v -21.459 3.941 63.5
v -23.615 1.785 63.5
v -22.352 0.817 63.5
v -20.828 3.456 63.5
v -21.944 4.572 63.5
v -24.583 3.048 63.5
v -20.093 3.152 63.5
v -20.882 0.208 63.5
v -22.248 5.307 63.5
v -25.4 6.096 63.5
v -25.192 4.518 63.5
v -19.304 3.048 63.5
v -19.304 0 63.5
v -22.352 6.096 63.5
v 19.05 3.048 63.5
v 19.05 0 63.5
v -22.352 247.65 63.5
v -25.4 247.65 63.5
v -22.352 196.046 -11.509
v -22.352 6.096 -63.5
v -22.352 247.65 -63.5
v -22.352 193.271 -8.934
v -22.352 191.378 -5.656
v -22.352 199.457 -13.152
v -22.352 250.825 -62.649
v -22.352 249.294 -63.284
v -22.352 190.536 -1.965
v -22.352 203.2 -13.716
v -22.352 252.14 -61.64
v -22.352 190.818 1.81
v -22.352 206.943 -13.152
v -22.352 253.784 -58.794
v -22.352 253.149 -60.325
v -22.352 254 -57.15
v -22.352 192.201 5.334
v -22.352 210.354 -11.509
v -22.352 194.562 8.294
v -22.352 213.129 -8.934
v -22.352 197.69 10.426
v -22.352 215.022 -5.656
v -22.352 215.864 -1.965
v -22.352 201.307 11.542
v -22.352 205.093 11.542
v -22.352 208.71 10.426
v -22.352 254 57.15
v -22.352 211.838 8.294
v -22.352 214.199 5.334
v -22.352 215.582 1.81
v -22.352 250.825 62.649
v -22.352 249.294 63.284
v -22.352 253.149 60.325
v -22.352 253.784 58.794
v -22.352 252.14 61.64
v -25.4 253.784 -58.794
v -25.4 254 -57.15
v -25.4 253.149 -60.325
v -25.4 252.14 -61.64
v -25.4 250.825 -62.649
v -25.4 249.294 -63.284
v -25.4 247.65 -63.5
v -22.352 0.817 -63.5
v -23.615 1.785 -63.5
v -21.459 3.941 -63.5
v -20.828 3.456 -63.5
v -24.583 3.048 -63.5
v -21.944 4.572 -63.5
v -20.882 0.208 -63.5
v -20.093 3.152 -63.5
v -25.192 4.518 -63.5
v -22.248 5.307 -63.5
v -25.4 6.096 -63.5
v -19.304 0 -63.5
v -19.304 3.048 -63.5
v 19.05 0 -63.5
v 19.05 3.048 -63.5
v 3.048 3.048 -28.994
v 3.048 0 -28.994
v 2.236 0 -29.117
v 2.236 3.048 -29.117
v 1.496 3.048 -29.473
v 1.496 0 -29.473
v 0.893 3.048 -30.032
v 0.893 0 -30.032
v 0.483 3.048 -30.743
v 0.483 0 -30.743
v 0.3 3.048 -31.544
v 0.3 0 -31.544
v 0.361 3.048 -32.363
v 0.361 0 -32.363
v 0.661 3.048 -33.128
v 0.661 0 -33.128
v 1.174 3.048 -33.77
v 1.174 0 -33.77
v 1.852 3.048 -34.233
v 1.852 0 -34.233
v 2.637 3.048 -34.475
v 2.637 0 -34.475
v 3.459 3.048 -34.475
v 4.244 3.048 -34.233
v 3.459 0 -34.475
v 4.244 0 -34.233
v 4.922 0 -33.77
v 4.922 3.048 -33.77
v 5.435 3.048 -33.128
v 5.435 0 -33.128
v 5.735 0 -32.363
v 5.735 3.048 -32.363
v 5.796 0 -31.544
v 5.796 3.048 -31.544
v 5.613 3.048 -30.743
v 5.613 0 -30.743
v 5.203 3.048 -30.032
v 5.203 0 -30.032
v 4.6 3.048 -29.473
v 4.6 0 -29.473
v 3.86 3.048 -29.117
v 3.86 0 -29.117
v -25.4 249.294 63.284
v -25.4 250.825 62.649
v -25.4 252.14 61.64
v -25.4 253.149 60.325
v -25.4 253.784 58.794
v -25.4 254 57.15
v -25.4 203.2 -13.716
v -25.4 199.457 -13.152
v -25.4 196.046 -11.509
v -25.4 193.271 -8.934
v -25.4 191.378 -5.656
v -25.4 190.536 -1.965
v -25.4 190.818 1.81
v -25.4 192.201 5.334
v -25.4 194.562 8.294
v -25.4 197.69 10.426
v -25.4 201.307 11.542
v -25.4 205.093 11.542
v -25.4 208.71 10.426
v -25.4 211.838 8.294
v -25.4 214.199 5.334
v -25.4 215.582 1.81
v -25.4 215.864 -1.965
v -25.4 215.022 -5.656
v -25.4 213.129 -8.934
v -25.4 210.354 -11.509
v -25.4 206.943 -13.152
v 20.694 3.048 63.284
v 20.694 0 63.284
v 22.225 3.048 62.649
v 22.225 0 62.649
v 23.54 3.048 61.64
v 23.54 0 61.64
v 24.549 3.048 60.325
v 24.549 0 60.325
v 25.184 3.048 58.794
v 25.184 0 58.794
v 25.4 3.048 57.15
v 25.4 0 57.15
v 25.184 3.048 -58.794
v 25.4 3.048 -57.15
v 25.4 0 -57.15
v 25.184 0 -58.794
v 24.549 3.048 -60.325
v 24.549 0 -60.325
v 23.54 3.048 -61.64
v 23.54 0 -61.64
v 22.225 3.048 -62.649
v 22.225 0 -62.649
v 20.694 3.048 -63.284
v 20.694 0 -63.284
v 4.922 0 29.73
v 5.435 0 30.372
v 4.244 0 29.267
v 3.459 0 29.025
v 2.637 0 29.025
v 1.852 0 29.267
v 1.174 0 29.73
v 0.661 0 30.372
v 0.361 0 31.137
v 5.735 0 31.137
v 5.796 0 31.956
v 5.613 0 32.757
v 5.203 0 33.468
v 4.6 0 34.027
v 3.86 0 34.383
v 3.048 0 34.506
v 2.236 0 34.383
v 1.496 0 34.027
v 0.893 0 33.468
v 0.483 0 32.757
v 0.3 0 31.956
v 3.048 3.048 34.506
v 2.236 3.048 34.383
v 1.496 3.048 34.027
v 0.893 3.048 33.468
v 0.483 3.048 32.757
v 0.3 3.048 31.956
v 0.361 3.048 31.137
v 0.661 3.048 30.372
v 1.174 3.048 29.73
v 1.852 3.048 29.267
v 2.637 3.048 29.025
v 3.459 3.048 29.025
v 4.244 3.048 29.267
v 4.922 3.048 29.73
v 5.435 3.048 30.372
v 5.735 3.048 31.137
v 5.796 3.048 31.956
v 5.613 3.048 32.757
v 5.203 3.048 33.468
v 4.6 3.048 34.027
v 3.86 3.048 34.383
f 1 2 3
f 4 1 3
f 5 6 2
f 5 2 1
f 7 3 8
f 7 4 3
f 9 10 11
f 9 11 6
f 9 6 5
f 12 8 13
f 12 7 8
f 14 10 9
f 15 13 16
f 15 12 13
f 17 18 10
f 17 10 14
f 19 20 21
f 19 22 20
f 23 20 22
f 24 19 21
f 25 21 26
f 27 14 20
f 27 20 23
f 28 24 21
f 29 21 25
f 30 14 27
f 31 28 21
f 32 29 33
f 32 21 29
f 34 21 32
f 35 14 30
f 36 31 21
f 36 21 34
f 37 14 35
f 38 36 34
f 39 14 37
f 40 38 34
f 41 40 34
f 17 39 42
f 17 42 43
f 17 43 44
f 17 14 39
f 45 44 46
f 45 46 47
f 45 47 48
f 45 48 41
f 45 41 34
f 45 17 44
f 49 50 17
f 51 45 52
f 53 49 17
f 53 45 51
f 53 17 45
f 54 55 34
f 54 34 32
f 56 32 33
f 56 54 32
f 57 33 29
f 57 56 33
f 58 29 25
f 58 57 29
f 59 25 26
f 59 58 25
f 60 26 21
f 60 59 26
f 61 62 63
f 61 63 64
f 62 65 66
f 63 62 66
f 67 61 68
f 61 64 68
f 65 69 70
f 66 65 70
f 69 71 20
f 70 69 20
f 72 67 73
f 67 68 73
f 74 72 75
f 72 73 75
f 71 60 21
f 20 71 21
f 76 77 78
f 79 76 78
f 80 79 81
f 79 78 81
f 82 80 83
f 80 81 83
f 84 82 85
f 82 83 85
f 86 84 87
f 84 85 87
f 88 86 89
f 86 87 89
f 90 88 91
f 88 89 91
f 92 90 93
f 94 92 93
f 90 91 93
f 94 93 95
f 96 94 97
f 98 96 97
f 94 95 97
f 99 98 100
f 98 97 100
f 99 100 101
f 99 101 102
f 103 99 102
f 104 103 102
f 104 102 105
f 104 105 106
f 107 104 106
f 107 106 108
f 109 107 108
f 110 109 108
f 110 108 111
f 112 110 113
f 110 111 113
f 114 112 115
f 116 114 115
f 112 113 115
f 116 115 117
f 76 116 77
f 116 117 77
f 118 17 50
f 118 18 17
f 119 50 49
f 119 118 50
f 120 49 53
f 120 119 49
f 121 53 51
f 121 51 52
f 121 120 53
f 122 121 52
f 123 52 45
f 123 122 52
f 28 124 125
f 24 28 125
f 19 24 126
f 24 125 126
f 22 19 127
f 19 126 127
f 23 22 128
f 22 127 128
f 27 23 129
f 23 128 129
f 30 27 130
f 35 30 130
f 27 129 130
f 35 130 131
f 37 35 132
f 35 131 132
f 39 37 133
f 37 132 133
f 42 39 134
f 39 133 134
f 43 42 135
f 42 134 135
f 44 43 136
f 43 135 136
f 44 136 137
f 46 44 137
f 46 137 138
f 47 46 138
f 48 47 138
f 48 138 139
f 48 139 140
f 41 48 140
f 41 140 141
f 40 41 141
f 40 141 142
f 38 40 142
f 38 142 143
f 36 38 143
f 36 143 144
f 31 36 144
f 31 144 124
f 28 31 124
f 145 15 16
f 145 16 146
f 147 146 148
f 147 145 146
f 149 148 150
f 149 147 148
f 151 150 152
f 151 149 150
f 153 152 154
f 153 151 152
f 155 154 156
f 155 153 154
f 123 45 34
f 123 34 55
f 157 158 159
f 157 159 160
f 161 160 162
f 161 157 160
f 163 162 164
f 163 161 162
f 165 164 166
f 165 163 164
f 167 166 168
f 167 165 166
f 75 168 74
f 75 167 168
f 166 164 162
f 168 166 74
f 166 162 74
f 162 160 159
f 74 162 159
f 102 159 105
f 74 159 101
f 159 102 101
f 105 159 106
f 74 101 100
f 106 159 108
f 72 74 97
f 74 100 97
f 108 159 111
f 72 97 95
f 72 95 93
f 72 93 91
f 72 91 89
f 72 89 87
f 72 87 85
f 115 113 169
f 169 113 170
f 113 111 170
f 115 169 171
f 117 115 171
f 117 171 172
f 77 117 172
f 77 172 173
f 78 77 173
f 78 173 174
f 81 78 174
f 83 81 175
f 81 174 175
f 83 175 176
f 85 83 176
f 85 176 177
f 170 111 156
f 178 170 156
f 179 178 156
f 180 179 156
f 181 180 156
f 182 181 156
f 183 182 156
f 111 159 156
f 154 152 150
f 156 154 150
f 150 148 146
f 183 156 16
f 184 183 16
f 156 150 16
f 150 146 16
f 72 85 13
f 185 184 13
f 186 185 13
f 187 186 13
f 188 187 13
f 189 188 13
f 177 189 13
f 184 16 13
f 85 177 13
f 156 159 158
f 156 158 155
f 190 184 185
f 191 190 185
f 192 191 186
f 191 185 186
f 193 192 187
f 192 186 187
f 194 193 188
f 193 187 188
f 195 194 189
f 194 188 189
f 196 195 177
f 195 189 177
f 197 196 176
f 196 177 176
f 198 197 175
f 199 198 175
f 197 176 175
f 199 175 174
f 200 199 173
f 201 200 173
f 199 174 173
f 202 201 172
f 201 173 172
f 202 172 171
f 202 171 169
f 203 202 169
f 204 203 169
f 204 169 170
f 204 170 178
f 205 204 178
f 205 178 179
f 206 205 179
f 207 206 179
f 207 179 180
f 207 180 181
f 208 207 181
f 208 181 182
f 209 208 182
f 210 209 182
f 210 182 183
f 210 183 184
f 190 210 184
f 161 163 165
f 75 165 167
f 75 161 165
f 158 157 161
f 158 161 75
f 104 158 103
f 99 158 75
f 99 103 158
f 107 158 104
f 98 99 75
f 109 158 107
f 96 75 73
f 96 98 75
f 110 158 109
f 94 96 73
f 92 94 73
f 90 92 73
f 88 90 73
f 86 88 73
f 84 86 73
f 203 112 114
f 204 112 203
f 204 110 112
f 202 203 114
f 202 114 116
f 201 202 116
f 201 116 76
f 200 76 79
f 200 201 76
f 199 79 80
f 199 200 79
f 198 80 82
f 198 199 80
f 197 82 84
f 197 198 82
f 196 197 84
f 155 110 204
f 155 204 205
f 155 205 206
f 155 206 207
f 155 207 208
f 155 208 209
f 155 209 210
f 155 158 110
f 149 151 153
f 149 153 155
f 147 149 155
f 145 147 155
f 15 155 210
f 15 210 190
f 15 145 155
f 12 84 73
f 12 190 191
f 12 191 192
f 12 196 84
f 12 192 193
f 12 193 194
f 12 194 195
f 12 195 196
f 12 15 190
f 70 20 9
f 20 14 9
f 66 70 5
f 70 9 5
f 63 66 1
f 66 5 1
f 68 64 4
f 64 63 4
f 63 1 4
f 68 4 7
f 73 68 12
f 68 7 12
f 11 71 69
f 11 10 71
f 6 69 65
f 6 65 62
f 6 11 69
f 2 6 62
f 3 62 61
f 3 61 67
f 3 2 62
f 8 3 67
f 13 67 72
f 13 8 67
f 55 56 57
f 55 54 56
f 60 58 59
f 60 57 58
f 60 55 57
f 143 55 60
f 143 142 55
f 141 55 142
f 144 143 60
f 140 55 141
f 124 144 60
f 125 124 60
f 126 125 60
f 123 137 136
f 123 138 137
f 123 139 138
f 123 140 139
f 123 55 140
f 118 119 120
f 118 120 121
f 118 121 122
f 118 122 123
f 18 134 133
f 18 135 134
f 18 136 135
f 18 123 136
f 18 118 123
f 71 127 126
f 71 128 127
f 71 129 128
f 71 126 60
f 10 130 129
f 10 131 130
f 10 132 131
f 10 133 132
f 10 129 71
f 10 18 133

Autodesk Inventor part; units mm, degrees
ref_plane "YZ Plane" through (0, 0, 0) normal (1, 0, 0) x (0, 1, 0)
ref_plane "XZ Plane" through (0, 0, 0) normal (0, 1, 0) x (-1, 0, 0)
ref_plane "XY Plane" through (0, 0, 0) normal (0, 0, 1) x (1, 0, 0)
sketch "Sketch1" plane through (0, 0, 0) normal (0, 1, 0) x (-1, 0, 0)
  line L0 (-25.4, 63.5) -> (25.4, 63.5)
  line L1 (25.4, 63.5) -> (25.4, -63.5)
  line L2 (25.4, -63.5) -> (-25.4, -63.5)
  line L3 (-25.4, -63.5) -> (-25.4, 63.5)
  line L4 (-25.4, 63.5) -> (25.4, -63.5) construction
  line L5 (25.4, 63.5) -> (-25.4, -63.5) construction
  point P0 (0, 0)
  dimension "d0" = 50.8
  dimension "d1" = 127
extrude "Plate1" add sketch "Sketch1" along normal blind 3.048
sketch "Sketch2" plane through (-22.352, 0, 63.5) normal (-1, 0, 0) x (0, -1, 0)
  line L0 (0, -127) -> (0, 0)
  line L1 (0, 0) -> (-254, 0)
  line L2 (-254, 0) -> (-254, -127)
  line L3 (-254, -127) -> (0, -127)
edge flange "Flange1" height 254 angle 90 thickness 3.048 bend radius 3.048 thickness toward (-1, 0, 0) relief tear relief width 3.048 relief depth 1.524 edges at (-25.4, 3.048, 0) wall of the first edge with corners at (-22.352, 0, -63.5) (-22.352, 0, 63.5) (-22.352, 254, 63.5) (-22.352, 254, -63.5)
bend "Bend1"
corner "Corner1"
sketch "Sketch3" plane through (0, 3.048, 0) normal (0, 1, 0) x (1, 0, 0)
  line L0 (25.4, -63.5) -> (-19.304, -63.5) construction
  line L1 (3.048, -63.5) -> (3.048, 63.5) construction
  line L2 (-19.304, 63.5) -> (25.4, 63.5) construction
  point P0 (0, 0)
  point P1 (3.048, -31.75)
  point P2 (3.048, 31.75)
  dimension "d20" = 63.5
  dimension "d21" = 31.75
hole "Hole1" at (3.048, 3.048, 31.75) at (3.048, 3.048, -31.75) direction (0, -1, 0) diameter 5.5118 end through all clearance for "Hex Head Cap Screw ISO 24017" size "M5" standard "ISO"
fillet "Corner Round1" radius 6.35 4 edges at (-23.876, 254, -63.5) (25.4, 1.524, 63.5) (25.4, 1.524, -63.5) (-23.876, 254, 63.5)
sketch "Sketch4" plane through (-22.352, 6.096, 63.5) normal (1, 0, 0) x (0, 0, -1)
  line L0 (0, 0) -> (0, 241.554) construction
  line L1 (120.65, 247.904) -> (6.35, 247.904) construction
  point P0 (63.5, -6.096)
  point P1 (64.516, 197.104)
  dimension "d23" = 64.516
  dimension "d31" = 50.8
hole "Hole2" at (-22.352, 203.2, -1.016) direction (-1, 0, 0) diameter 25.4 end through all
equation "\"d21\" = 0.5 * d20"
equation "\"d18\" = Thickness"
equation "\"d2\" = Thickness"
equation "\"d3\" = BendReliefWidth"
equation "\"d4\" = BendReliefDepth"
equation "\"d5\" = MinimumRemnant"
equation "\"d6\" = TransitionRadius"
equation "\"d9\" = BendRadius"
equation "\"d10\" = CornerReliefSize"
equation "\"d11\" = GapSize"
equation "\"d12\" = JacobiRadiusSize"
equation "\"BendRadius\" = Thickness"
equation "\"BendReliefWidth\" = Thickness"
equation "\"BendReliefDepth\" = 0.5 * Thickness"
equation "\"CornerReliefSize\" = 4 * Thickness"
equation "\"MinimumRemnant\" = 2 * Thickness"
equation "\"TransitionRadius\" = BendRadius"
equation "\"JacobiRadiusSize\" = BendRadius"
equation "\"GapSize\" = Thickness"
equation "\"Thickness\" = 3.048"
properties part number "Bracket"
